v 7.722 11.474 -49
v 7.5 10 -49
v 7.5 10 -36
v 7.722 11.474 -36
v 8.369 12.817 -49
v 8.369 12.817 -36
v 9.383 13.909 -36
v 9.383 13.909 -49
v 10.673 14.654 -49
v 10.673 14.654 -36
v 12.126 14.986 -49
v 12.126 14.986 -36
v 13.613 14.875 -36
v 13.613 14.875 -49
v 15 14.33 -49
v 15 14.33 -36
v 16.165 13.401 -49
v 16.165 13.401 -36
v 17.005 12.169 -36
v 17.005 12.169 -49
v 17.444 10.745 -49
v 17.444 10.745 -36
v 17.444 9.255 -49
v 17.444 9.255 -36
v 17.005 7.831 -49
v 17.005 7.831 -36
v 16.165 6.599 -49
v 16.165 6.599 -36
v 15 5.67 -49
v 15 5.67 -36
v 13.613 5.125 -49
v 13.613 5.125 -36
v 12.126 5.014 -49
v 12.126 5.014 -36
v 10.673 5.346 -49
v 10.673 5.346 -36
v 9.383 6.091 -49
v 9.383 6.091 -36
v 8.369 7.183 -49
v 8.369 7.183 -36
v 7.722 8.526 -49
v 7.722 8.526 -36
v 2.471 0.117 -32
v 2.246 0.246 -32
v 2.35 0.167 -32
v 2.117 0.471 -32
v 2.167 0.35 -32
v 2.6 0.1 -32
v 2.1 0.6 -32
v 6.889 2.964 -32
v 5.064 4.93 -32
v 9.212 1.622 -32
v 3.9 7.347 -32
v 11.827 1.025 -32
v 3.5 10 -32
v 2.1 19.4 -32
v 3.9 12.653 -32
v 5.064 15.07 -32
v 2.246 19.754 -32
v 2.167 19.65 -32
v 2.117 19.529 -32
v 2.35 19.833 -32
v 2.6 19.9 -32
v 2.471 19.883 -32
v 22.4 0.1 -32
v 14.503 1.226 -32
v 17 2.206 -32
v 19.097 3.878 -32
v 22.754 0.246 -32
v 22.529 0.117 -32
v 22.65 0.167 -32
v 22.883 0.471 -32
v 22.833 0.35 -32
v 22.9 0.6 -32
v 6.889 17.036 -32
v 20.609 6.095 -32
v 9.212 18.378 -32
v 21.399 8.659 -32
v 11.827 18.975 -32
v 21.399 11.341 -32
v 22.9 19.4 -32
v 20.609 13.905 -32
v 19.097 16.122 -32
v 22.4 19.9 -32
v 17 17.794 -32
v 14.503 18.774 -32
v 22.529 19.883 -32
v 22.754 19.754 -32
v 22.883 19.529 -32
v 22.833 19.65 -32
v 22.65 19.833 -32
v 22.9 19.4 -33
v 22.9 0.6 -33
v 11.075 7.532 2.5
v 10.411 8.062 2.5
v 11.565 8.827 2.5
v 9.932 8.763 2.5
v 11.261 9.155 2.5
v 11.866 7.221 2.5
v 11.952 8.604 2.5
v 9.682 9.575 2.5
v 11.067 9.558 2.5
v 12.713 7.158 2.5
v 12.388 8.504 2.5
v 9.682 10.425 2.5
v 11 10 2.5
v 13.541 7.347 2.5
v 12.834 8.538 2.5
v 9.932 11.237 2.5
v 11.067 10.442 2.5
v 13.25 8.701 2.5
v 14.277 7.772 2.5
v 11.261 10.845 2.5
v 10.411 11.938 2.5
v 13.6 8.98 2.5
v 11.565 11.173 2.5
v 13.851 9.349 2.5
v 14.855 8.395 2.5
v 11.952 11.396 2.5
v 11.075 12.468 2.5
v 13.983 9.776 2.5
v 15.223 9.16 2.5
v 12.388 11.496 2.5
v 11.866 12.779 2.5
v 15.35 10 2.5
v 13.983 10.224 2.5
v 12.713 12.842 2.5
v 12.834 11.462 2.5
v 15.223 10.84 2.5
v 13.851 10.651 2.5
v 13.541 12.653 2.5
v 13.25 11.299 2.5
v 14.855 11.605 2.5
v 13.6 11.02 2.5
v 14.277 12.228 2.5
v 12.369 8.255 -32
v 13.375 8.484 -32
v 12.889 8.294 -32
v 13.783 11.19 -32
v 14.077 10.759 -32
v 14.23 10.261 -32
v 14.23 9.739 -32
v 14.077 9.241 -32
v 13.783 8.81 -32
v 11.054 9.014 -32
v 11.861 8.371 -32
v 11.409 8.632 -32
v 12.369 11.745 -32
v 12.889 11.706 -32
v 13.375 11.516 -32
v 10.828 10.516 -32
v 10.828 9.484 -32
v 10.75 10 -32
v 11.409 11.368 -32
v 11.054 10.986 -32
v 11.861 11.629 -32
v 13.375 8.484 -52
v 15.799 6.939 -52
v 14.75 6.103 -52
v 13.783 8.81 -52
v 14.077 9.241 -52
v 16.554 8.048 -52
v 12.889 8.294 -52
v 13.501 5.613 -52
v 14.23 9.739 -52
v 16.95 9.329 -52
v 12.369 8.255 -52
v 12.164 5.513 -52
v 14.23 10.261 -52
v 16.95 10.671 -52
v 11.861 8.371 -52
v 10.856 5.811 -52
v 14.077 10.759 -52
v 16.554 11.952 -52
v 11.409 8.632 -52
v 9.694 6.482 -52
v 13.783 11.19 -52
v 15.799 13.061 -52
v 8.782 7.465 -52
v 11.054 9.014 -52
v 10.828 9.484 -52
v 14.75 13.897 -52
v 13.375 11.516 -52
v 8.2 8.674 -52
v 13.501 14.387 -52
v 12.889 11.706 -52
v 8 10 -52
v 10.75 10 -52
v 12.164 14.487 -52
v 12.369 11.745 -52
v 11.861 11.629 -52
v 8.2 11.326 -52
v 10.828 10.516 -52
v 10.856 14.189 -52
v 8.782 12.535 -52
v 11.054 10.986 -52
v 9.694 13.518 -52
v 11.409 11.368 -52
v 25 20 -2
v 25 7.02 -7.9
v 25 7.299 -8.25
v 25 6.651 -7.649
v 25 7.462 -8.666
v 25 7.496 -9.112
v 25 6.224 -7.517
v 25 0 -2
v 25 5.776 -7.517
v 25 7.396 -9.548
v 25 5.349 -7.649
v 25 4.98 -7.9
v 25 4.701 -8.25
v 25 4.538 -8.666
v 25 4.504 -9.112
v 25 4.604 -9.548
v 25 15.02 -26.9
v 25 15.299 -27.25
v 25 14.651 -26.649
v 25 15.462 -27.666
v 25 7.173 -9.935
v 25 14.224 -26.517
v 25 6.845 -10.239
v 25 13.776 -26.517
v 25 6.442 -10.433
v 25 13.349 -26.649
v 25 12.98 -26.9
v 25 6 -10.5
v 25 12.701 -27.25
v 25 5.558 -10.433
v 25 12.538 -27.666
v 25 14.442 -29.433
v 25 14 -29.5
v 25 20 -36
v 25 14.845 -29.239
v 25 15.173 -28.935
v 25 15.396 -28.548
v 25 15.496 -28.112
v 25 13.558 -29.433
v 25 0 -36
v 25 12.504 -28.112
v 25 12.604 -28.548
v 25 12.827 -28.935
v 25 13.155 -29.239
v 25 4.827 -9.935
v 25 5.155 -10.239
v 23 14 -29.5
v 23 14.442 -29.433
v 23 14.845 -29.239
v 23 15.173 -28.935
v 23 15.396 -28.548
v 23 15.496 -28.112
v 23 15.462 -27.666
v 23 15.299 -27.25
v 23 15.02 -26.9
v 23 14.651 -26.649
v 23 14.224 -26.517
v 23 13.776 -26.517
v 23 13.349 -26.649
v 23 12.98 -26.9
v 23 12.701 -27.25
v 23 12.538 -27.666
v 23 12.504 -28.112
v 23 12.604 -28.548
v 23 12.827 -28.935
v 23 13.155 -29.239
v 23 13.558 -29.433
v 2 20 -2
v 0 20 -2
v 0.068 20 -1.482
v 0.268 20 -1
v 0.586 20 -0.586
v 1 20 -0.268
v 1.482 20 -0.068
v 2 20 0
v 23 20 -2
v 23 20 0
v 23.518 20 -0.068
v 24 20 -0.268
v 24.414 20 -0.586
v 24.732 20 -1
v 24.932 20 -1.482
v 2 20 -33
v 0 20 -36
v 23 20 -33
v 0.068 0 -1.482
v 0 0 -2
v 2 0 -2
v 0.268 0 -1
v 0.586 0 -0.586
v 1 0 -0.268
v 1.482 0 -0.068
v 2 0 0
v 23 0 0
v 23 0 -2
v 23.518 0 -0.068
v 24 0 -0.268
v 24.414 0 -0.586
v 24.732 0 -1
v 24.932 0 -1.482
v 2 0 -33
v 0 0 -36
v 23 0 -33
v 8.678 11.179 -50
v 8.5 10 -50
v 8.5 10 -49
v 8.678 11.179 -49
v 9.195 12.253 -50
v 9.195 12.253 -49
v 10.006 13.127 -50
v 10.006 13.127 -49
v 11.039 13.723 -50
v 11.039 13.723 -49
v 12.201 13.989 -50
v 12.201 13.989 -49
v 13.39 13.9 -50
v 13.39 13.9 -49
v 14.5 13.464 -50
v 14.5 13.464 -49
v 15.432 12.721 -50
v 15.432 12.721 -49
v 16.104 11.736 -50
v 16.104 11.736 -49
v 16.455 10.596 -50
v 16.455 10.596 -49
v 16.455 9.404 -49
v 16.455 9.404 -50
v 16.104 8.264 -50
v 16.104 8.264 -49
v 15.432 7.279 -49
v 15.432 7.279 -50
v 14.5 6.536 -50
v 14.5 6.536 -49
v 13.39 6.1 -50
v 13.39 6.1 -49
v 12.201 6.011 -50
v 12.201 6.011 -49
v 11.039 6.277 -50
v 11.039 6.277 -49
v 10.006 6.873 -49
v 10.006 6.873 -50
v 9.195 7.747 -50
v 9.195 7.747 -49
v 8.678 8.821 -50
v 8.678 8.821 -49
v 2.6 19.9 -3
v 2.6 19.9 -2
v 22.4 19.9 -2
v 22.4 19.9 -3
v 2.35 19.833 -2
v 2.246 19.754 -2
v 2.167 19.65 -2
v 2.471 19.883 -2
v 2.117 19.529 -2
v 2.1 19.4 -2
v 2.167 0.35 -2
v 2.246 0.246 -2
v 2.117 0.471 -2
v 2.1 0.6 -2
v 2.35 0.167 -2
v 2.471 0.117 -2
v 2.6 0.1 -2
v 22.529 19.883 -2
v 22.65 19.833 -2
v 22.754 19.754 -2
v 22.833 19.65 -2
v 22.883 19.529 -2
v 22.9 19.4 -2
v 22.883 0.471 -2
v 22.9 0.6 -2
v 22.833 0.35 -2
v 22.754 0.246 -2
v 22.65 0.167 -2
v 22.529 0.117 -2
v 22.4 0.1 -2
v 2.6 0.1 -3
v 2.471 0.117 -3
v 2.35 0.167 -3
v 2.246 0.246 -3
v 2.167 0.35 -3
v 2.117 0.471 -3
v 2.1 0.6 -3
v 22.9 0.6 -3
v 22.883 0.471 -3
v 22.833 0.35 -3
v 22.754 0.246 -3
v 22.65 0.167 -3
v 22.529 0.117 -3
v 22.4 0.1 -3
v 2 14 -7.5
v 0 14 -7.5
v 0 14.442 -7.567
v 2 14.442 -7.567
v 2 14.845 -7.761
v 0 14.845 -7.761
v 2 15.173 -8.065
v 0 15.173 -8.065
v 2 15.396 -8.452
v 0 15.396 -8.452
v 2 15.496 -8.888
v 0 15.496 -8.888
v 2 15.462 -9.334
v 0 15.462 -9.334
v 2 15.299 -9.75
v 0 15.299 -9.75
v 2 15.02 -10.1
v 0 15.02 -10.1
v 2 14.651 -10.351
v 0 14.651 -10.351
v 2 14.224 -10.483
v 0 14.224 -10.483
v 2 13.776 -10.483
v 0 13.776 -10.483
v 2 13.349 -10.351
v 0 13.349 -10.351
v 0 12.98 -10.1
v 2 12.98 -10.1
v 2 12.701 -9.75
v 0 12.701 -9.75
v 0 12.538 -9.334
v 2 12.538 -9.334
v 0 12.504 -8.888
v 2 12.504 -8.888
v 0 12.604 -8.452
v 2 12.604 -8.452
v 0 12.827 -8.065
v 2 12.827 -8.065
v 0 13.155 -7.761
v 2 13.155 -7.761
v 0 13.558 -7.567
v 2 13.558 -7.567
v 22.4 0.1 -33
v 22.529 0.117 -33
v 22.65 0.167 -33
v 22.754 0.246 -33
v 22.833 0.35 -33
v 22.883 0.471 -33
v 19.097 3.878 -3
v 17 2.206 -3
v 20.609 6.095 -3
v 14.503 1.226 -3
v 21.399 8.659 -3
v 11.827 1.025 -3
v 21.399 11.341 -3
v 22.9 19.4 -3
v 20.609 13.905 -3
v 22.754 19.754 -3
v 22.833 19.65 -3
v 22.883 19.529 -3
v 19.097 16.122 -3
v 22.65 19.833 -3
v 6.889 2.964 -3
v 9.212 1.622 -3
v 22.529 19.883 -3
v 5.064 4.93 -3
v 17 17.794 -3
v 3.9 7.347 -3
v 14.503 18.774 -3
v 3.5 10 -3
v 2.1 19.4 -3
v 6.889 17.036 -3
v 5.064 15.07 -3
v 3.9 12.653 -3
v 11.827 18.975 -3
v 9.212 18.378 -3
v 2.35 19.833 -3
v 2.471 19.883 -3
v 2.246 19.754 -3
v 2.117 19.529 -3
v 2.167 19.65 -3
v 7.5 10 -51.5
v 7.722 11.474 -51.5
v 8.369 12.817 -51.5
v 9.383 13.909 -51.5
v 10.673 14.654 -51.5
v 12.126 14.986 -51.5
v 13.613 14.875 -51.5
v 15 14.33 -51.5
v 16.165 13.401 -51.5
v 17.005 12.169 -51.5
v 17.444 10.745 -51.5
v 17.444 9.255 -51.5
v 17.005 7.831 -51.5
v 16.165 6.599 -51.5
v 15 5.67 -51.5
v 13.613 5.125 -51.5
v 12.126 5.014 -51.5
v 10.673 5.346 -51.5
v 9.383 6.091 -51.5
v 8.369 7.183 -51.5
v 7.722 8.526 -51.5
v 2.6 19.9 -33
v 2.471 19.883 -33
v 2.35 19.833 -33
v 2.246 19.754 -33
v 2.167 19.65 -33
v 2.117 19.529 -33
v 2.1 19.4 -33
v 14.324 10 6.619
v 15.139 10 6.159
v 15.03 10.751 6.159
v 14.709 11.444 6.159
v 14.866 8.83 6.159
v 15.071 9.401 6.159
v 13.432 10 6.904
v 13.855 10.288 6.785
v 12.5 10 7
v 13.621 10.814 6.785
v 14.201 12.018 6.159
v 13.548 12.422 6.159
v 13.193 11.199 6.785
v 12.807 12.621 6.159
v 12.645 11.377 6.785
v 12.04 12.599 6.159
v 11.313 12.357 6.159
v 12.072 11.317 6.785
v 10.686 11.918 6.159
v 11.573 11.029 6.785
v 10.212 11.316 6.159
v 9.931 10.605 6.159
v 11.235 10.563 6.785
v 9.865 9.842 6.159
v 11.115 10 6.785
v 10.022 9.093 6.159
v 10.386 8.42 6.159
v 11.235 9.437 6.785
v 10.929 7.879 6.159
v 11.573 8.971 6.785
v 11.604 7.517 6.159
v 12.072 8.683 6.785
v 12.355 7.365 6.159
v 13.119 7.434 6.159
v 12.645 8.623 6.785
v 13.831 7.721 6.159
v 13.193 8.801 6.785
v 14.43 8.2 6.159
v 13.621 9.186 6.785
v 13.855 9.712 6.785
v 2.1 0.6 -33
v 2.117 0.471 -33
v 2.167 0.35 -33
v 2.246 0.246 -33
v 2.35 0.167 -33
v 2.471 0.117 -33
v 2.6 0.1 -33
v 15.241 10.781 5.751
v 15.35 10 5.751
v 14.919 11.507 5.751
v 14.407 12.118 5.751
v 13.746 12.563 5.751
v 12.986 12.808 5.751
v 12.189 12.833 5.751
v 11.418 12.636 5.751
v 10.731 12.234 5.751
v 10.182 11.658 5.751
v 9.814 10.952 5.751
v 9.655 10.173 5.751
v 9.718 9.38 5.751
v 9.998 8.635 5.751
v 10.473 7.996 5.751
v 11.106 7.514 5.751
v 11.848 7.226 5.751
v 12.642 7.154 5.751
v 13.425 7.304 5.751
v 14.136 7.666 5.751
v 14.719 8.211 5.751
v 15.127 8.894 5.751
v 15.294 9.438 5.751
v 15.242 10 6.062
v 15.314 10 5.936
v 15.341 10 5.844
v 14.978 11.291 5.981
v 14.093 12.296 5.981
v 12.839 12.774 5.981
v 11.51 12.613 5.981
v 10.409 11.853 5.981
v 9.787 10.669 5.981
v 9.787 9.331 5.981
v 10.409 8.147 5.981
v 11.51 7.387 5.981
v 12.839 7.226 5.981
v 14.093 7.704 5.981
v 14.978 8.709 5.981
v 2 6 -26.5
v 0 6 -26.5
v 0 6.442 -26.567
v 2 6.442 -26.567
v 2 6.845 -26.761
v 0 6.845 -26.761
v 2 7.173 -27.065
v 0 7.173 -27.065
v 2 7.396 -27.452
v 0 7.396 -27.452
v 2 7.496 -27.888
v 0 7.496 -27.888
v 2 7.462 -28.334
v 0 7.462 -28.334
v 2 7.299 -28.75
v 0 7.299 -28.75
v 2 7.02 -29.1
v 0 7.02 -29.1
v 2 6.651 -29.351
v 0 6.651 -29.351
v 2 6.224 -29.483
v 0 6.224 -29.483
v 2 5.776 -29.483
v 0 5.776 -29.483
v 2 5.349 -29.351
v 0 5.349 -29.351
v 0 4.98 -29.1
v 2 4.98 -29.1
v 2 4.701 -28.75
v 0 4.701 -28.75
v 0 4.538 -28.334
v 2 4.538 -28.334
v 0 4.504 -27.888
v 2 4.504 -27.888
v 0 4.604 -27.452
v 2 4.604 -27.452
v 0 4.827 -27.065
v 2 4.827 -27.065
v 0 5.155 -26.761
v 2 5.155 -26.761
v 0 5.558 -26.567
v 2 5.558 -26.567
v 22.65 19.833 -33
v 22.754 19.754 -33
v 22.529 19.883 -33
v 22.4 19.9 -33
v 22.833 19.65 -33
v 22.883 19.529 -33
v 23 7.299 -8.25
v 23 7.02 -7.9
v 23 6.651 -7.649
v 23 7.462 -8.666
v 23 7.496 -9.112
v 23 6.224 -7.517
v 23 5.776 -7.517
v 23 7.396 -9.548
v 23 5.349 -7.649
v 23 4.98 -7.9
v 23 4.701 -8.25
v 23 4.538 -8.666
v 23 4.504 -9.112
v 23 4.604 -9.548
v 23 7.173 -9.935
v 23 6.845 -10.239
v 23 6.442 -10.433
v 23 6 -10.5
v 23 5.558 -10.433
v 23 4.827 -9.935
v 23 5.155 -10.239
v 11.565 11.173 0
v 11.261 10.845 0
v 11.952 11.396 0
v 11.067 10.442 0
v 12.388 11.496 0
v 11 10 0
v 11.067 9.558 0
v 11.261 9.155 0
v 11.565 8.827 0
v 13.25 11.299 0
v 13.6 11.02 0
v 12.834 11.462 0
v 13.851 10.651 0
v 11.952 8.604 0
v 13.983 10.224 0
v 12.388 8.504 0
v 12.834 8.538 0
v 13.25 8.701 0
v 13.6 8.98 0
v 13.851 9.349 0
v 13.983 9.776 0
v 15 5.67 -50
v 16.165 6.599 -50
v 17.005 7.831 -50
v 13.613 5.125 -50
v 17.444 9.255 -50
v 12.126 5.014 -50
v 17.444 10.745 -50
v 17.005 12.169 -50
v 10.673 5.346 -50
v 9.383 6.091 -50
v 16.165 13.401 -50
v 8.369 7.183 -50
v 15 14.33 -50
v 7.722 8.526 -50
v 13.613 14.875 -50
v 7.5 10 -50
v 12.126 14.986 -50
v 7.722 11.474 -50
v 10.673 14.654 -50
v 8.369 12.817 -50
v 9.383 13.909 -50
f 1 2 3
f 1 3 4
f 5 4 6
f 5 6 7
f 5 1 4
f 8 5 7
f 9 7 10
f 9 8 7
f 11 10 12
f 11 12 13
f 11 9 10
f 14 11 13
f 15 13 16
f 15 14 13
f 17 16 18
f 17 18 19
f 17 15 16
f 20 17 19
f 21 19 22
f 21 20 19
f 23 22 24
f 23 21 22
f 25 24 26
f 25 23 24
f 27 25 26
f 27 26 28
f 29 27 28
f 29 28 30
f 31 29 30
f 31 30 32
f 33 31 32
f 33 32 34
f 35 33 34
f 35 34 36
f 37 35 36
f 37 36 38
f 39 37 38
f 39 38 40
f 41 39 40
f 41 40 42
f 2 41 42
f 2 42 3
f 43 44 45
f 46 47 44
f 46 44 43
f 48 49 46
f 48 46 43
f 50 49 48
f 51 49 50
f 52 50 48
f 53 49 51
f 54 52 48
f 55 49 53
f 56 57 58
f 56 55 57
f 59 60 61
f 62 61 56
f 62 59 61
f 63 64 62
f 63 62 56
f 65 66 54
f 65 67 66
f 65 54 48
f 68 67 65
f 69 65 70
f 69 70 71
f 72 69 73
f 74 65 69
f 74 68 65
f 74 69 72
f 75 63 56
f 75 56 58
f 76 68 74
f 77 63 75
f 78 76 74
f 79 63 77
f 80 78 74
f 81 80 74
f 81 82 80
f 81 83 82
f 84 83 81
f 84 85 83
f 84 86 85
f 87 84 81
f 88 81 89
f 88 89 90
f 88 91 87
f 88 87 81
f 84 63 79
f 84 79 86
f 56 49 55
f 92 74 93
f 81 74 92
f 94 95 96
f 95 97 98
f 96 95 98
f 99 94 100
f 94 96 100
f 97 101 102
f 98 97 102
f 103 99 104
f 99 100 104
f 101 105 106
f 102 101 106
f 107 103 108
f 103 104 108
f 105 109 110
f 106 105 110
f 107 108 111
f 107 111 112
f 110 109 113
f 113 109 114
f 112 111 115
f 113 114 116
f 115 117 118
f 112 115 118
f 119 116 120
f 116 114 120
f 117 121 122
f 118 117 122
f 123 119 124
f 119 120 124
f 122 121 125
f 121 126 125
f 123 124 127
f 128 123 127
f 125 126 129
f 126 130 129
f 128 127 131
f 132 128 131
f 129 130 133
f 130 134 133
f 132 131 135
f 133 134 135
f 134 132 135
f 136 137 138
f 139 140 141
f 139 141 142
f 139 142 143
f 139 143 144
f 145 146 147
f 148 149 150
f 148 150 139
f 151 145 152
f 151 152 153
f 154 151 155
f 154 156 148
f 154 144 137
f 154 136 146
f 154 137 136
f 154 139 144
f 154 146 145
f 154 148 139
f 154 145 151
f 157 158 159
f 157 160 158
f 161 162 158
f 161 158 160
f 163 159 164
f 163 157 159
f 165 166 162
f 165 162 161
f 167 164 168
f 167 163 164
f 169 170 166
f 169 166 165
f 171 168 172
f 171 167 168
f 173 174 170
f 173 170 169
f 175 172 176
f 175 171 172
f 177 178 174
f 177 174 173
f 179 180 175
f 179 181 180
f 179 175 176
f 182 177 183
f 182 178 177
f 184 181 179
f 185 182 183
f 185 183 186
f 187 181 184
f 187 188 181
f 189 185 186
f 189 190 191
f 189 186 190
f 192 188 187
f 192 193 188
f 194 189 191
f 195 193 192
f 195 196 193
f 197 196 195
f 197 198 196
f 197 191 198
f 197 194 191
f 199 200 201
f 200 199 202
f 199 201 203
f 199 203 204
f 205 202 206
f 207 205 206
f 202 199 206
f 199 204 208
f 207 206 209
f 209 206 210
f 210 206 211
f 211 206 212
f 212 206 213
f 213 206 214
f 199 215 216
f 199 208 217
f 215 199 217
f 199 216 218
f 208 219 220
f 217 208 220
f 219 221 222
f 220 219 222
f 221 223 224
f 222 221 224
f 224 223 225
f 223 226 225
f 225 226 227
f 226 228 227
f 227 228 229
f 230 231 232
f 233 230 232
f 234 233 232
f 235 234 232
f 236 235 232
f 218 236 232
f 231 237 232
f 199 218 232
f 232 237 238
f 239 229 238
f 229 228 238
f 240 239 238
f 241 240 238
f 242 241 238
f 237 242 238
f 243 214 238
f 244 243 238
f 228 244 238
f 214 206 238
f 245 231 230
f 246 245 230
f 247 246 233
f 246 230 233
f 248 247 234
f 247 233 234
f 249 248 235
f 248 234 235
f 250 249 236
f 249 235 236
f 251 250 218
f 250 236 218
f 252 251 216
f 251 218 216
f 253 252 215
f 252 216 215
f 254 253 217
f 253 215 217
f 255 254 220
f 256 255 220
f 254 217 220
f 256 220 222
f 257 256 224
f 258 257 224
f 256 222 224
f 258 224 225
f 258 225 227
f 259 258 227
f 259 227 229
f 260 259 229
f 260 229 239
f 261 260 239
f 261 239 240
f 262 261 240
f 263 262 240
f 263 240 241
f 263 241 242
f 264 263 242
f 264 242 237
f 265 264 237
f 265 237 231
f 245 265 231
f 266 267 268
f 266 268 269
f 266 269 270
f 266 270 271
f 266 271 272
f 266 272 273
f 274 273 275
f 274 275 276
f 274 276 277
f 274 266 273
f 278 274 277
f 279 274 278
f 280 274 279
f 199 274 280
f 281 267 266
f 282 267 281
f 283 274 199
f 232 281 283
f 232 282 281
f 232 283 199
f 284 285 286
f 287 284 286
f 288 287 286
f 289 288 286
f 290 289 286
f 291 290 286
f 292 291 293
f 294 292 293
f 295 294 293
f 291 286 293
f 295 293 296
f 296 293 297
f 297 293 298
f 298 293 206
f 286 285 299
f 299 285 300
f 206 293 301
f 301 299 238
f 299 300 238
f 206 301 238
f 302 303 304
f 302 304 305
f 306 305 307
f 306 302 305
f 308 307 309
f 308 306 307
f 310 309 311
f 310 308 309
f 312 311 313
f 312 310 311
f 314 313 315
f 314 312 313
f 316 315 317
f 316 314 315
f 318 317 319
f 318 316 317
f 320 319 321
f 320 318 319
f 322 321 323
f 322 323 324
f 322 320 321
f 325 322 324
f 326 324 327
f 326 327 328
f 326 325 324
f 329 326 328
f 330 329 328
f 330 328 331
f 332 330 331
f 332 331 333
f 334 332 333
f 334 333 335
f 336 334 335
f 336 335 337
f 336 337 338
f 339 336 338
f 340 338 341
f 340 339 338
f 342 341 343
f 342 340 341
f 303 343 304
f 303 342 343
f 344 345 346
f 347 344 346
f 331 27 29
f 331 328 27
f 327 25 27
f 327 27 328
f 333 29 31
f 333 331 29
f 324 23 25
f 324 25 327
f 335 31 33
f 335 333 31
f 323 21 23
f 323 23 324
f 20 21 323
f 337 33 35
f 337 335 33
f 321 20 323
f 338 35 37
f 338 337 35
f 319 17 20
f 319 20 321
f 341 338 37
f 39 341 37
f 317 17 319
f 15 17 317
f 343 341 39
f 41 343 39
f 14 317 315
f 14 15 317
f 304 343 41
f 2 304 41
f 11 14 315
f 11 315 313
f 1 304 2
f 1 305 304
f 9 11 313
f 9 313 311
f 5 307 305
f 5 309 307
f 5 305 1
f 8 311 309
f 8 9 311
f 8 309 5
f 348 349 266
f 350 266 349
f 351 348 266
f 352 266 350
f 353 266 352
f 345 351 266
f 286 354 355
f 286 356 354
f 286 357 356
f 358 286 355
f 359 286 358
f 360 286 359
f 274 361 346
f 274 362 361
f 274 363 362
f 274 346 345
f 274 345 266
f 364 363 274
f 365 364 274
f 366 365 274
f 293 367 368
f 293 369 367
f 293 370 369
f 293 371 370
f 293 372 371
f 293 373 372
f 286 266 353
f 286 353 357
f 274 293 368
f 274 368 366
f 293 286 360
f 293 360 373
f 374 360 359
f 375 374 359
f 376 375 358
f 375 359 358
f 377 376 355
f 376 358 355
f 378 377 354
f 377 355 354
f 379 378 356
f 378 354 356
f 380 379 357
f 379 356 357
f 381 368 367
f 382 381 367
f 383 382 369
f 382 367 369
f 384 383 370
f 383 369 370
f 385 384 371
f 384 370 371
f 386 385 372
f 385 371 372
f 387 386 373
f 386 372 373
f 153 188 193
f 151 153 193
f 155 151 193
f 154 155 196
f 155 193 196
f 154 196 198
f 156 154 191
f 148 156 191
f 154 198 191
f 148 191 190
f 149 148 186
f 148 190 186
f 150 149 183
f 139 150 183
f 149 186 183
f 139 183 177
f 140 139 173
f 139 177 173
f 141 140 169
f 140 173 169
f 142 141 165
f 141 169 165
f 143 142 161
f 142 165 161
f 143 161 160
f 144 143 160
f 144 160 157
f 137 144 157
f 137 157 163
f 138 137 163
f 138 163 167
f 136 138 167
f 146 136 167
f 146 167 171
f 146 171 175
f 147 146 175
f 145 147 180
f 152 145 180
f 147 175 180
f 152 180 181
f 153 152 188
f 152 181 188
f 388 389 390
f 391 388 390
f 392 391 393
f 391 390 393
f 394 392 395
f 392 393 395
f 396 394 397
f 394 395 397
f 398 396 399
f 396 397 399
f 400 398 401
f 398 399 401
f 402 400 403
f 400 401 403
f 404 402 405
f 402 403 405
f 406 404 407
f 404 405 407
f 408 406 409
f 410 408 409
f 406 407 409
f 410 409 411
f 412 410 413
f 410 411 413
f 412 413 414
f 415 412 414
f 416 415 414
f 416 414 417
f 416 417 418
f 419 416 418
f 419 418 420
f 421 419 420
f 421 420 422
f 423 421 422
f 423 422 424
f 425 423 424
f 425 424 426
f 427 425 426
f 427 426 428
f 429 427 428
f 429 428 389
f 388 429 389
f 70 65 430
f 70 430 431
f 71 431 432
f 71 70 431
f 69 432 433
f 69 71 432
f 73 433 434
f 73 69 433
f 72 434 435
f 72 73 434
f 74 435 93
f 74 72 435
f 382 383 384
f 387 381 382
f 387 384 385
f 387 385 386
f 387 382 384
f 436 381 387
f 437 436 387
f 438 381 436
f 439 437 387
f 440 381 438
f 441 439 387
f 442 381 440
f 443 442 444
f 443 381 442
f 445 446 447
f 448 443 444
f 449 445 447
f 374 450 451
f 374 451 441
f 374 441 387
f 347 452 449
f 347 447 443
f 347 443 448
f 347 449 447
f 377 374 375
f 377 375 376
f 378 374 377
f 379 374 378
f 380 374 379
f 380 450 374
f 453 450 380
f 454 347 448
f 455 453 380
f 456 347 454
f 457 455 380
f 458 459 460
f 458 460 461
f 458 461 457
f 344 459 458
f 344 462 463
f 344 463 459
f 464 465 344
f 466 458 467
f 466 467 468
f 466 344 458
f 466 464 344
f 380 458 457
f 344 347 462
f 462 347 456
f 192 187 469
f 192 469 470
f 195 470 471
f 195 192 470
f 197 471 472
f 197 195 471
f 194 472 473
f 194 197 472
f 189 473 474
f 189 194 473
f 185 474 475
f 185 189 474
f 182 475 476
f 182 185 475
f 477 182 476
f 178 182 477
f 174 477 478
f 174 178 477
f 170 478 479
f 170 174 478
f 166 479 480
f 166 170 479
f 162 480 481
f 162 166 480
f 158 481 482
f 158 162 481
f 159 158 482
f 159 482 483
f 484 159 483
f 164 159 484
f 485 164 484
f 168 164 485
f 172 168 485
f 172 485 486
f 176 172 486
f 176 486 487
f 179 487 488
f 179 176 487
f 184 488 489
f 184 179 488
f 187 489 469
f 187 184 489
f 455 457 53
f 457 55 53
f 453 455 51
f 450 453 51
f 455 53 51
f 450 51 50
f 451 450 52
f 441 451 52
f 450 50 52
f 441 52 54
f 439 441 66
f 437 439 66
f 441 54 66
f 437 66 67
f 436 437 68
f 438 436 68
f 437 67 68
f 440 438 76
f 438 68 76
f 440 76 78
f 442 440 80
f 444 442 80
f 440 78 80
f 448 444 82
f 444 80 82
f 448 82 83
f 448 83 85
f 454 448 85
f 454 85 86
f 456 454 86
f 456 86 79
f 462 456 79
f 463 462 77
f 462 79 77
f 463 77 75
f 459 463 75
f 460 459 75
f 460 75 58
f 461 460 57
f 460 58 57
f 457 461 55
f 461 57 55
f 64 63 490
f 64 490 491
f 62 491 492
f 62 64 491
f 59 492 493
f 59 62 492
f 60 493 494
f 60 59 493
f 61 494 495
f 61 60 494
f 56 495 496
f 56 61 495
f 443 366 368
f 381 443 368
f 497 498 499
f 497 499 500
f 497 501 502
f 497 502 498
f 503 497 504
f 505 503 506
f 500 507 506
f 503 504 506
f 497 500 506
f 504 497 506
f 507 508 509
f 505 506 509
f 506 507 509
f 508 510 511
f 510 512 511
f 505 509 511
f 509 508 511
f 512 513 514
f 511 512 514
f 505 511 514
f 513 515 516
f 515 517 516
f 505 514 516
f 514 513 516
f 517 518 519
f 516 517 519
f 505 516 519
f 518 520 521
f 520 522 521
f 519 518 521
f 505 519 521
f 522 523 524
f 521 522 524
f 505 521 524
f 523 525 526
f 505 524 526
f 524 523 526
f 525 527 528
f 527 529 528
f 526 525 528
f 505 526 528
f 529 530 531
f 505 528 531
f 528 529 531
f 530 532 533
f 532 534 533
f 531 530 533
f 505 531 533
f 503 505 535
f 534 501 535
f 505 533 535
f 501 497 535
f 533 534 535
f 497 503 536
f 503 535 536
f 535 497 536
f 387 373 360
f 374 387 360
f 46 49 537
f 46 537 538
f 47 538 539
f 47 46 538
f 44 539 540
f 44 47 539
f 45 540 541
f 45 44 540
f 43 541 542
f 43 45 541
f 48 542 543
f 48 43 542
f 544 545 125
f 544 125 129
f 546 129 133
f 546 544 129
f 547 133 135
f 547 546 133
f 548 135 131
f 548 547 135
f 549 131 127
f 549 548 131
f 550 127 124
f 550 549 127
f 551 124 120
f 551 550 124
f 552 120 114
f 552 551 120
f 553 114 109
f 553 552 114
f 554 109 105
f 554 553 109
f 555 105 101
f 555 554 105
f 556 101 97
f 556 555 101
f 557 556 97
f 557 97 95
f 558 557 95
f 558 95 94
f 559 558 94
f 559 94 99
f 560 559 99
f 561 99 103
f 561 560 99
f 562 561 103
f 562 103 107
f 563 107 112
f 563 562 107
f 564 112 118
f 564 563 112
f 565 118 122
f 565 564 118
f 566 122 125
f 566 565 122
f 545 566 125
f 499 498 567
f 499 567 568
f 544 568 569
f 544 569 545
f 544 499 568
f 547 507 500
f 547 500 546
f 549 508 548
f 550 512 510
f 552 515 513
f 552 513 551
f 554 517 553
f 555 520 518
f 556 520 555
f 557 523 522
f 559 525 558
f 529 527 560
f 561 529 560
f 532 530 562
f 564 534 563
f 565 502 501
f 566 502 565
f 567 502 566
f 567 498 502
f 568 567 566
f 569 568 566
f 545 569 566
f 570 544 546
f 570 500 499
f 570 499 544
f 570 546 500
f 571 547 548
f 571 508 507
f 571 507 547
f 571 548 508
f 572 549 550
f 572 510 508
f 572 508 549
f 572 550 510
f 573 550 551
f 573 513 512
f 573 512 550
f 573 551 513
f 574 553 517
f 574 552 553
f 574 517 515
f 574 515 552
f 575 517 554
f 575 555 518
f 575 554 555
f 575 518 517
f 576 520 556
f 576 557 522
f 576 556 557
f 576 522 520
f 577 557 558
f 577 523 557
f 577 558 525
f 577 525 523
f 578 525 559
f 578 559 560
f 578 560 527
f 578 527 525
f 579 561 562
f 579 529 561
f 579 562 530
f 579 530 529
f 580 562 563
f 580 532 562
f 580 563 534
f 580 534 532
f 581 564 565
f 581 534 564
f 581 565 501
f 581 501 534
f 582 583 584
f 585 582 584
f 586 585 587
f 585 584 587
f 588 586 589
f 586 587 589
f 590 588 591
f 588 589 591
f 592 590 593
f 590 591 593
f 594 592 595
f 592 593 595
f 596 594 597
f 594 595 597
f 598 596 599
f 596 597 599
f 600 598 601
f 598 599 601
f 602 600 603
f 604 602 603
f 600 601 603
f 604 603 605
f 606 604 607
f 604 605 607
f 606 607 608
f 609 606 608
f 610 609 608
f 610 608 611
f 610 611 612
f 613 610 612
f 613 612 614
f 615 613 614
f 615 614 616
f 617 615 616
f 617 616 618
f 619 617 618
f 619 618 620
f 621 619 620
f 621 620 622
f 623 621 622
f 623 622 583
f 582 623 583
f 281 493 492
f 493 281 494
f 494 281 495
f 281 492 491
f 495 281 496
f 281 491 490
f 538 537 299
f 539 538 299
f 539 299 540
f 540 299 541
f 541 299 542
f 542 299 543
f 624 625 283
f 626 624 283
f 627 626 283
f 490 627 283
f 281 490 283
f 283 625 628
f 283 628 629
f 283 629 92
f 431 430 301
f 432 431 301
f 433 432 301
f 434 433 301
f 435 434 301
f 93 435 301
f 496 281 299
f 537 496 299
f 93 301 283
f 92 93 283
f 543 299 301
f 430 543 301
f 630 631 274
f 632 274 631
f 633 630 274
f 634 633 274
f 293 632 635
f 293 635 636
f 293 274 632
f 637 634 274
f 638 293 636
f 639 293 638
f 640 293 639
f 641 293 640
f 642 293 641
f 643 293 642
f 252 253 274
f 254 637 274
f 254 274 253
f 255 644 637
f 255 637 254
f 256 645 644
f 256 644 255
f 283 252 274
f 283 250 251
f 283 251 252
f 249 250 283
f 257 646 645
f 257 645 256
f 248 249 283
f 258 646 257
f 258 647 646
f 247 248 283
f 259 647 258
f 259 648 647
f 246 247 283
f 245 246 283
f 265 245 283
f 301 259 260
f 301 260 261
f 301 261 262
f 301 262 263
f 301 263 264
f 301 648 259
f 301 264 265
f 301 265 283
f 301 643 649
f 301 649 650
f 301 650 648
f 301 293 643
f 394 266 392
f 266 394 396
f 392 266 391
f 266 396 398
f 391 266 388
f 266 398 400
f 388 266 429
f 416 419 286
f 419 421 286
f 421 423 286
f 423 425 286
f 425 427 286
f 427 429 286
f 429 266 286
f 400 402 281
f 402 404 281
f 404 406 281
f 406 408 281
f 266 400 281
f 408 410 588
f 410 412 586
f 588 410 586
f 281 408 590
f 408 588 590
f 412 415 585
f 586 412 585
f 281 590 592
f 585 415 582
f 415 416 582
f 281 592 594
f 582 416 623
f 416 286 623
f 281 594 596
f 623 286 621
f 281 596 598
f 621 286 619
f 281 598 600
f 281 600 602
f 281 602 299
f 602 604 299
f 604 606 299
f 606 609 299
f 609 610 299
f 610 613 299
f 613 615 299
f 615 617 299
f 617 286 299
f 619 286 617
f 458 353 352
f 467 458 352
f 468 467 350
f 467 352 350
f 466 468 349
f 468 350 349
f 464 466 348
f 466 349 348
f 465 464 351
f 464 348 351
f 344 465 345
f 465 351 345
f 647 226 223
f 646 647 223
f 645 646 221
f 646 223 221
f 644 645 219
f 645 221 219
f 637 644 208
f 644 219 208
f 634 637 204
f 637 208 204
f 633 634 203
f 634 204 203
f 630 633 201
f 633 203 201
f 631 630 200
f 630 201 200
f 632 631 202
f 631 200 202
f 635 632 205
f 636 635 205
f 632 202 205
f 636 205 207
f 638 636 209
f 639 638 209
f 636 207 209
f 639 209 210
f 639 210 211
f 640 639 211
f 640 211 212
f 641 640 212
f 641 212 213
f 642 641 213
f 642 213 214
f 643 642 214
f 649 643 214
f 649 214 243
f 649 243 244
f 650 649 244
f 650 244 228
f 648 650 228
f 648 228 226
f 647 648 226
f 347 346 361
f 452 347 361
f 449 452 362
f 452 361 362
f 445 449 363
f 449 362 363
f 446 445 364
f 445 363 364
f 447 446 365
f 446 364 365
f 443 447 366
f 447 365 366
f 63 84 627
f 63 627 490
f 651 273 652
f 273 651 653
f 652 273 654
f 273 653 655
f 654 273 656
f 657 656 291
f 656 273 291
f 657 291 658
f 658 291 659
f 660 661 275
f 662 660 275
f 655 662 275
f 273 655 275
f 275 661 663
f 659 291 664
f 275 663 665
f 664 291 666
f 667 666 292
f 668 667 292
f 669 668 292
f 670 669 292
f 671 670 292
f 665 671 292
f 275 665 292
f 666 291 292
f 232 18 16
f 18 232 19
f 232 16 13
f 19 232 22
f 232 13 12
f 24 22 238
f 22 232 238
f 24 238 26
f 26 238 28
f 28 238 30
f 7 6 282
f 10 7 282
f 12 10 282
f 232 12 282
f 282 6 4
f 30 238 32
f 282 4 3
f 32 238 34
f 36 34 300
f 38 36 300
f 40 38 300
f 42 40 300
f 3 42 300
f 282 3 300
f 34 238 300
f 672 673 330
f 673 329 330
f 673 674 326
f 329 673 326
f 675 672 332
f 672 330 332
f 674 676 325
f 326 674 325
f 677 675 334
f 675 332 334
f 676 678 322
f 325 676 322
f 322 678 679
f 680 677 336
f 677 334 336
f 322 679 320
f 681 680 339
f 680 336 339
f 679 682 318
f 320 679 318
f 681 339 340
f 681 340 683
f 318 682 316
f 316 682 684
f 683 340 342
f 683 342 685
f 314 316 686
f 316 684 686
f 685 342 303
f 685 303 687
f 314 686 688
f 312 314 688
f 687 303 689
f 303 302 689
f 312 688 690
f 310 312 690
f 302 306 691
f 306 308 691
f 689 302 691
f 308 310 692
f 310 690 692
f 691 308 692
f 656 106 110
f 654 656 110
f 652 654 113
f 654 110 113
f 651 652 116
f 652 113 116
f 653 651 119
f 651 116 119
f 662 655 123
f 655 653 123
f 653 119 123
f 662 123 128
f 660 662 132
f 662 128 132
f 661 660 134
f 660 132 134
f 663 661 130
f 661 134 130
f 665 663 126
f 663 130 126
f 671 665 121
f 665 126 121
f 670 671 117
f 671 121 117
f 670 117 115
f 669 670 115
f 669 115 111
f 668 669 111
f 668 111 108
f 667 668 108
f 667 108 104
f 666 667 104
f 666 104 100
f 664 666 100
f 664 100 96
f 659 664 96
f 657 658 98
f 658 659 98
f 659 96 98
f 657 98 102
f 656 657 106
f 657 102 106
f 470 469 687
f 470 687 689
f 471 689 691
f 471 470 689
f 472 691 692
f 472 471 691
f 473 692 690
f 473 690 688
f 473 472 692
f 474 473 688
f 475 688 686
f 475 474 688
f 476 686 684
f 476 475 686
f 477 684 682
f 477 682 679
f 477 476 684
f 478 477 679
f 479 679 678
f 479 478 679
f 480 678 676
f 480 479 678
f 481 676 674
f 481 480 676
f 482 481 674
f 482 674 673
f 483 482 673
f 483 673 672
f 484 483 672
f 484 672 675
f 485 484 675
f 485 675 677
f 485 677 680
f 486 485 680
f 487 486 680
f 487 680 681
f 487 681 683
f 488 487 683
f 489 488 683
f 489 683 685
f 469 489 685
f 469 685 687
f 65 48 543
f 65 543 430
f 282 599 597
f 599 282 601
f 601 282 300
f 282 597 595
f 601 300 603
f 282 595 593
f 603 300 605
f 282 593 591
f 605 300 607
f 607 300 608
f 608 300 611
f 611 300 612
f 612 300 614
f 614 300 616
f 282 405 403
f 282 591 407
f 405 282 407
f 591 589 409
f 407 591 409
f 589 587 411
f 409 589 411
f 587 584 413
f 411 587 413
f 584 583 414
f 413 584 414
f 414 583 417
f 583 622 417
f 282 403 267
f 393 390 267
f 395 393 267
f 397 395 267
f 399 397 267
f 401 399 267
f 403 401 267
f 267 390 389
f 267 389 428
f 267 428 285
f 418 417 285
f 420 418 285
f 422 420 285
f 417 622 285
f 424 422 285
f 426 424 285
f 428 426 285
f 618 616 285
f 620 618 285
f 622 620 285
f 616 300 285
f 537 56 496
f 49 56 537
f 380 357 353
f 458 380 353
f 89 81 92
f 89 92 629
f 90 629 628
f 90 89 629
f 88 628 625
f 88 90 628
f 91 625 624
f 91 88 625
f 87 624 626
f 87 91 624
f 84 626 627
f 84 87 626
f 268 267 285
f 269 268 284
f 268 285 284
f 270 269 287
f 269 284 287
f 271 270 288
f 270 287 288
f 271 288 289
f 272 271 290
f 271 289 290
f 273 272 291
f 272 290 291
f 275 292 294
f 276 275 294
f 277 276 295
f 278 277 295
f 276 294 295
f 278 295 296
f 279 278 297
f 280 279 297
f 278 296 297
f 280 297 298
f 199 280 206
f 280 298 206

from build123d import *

# Parameters (mm, degrees)
SKETCH_1_W          = 21
SKETCH_1_H          = 31
EXTRUDE_1_DEPTH     = 20
CUT_EXTRUDE_5_REACH = 50.177
SKETCH_14_R         = 1.5
CUT_EXTRUDE_6_REACH = 50.177
SKETCH_15_R         = 1.5
EXTRUDE_2_DEPTH     = 1
EXTRUDE_START       = 1
EXTRUDE_3_DEPTH     = 1
SKETCH_4_R          = 1.5
CUT_EXTRUDE_1_DEPTH = 3
SKETCH_5_R          = 5
CUT_EXTRUDE_2_DEPTH = 4
SKETCH_6_W          = 9
SKETCH_6_H          = 29
EXTRUDE_START_2     = -8
SKETCH_7_R          = 1.5
EXTRUDE_4_DEPTH     = 8
EXTRUDE_START_3     = 20
SKETCH_8_R          = 5
EXTRUDE_5_DEPTH     = 20
SKETCH_10_R         = 1.75
CUT_EXTRUDE_4_DEPTH = 20
SKETCH_9_R          = 5
SKETCH_9_R_2        = 4
CUT_EXTRUDE_3_DEPTH = 1
SKETCH_11_R         = 2.85
EXTRUDE_6_DEPTH     = 3.5
FILLET_1_R          = 0.5
CHAMFER_1_SIZE      = 0.5


with BuildPart() as part:
    # ｽｹｯﾁ1 → ﾎﾞｽ - 押し出し1 (new body)
    with BuildSketch(Plane(origin=(0, 0, 0), x_dir=(1, 0, 0), z_dir=(0, 1, 0))):
        with BuildLine():
            Line((2, 0), (23, 0))
            ThreePointArc((23, 0), (24.414213562, 0.585786438), (25, 2))
            Line((25, 2), (25, 36))
            Line((25, 36), (0, 36))
            Line((0, 36), (0, 2))
            ThreePointArc((0, 2), (0.585786438, 0.585786438), (2, 0))
        make_face()
        with Locations((12.5, 17.5)):
            Rectangle(SKETCH_1_W, SKETCH_1_H, mode=Mode.SUBTRACT)
    extrude(amount=EXTRUDE_1_DEPTH)

    # ｽｹｯﾁ14 → ｶｯﾄ - 押し出し5 (cut, up to next)
    with BuildSketch(Plane(origin=(25, 0, 0), x_dir=(0, 0, -1), z_dir=(1, 0, 0)), mode=Mode.PRIVATE) as cut_extrude_5_sk1:
        with Locations((9, 6)):
            Circle(SKETCH_14_R)
    cut_extrude_5_tool1 = extrude(cut_extrude_5_sk1.sketch, amount=-CUT_EXTRUDE_5_REACH, mode=Mode.PRIVATE) & part.part
    # ｽｹｯﾁ14 → ｶｯﾄ - 押し出し5 (cut, up to next)
    with BuildSketch(Plane(origin=(25, 0, 0), x_dir=(0, 0, -1), z_dir=(1, 0, 0)), mode=Mode.PRIVATE) as cut_extrude_5_sk2:
        with Locations((28, 14)):
            Circle(SKETCH_14_R)
    cut_extrude_5_tool2 = extrude(cut_extrude_5_sk2.sketch, amount=-CUT_EXTRUDE_5_REACH, mode=Mode.PRIVATE) & part.part
    add(cut_extrude_5_tool1.solids().sort_by_distance((25, 6, -9))[0], mode=Mode.SUBTRACT)
    add(cut_extrude_5_tool2.solids().sort_by_distance((25, 14, -28))[0], mode=Mode.SUBTRACT)

    # ｽｹｯﾁ15 → ｶｯﾄ - 押し出し6 (cut, up to next)
    with BuildSketch(Plane.ZY, mode=Mode.PRIVATE) as cut_extrude_6_sk1:
        with Locations((-28, 6)):
            Circle(SKETCH_15_R)
    cut_extrude_6_tool1 = extrude(cut_extrude_6_sk1.sketch, amount=-CUT_EXTRUDE_6_REACH, mode=Mode.PRIVATE) & part.part
    # ｽｹｯﾁ15 → ｶｯﾄ - 押し出し6 (cut, up to next)
    with BuildSketch(Plane.ZY, mode=Mode.PRIVATE) as cut_extrude_6_sk2:
        with Locations((-9, 14)):
            Circle(SKETCH_15_R)
    cut_extrude_6_tool2 = extrude(cut_extrude_6_sk2.sketch, amount=-CUT_EXTRUDE_6_REACH, mode=Mode.PRIVATE) & part.part
    add(cut_extrude_6_tool1.solids().sort_by_distance((0, 6, -28))[0], mode=Mode.SUBTRACT)
    add(cut_extrude_6_tool2.solids().sort_by_distance((0, 14, -9))[0], mode=Mode.SUBTRACT)

    # ｽｹｯﾁ2 → ﾎﾞｽ - 押し出し2 (add)
    with BuildSketch(Plane(origin=(0, 0, -2), x_dir=(-1, 0, 0), z_dir=(0, 0, -1))):
        with BuildLine():
            Line((-22.4, 0.1), (-2.6, 0.1))
            ThreePointArc((-2.6, 0.1), (-2.246446609, 0.246446609), (-2.1, 0.6))
            Line((-2.1, 0.6), (-2.1, 19.4))
            ThreePointArc((-2.1, 19.4), (-2.246446609, 19.753553391), (-2.6, 19.9))
            Line((-2.6, 19.9), (-22.4, 19.9))
            ThreePointArc((-22.4, 19.9), (-22.753553391, 19.753553391), (-22.9, 19.4))
            Line((-22.9, 19.4), (-22.9, 0.6))
            ThreePointArc((-22.9, 0.6), (-22.753553391, 0.246446609), (-22.4, 0.1))
        make_face()
    extrude(amount=EXTRUDE_2_DEPTH)

    # ｽｹｯﾁ3 → ﾎﾞｽ - 押し出し3 (add)
    with BuildSketch(Plane.XY.offset(-33).offset(EXTRUDE_START)):
        with BuildLine():
            Line((2.6, 0.1), (22.4, 0.1))
            ThreePointArc((22.4, 0.1), (22.753553391, 0.246446609), (22.9, 0.6))
            Line((22.9, 0.6), (22.9, 19.4))
            ThreePointArc((22.9, 19.4), (22.753553391, 19.753553391), (22.4, 19.9))
            Line((22.4, 19.9), (2.6, 19.9))
            ThreePointArc((2.6, 19.9), (2.246446609, 19.753553391), (2.1, 19.4))
            Line((2.1, 19.4), (2.1, 0.6))
            ThreePointArc((2.1, 0.6), (2.246446609, 0.246446609), (2.6, 0.1))
        make_face()
    extrude(amount=-EXTRUDE_3_DEPTH)

    # ｽｹｯﾁ4 → ｶｯﾄ - 押し出し1 (cut)
    with BuildSketch(Plane.XY):
        with Locations((12.5, 10)):
            Circle(SKETCH_4_R)
    extrude(amount=-CUT_EXTRUDE_1_DEPTH, mode=Mode.SUBTRACT)

    # ｽｹｯﾁ5 → ｶｯﾄ - 押し出し2 (cut)
    with BuildSketch(Plane(origin=(0, 0, -36), x_dir=(-1, 0, 0), z_dir=(0, 0, -1))):
        with Locations((-12.5, 10)):
            Circle(SKETCH_5_R)
    extrude(amount=-CUT_EXTRUDE_2_DEPTH, mode=Mode.SUBTRACT)

    # ｽｹｯﾁ6 → 回転1 (revolve)
    with BuildSketch(Plane(origin=(0, 10, 0), x_dir=(1, 0, 0), z_dir=(0, 1, 0))):
        with Locations((8, 17.5)):
            Rectangle(SKETCH_6_W, SKETCH_6_H)
    revolve(axis=Axis((12.5, 10, -32), (0, 0, 1)))

    # ｽｹｯﾁ7 → ﾎﾞｽ - 押し出し4 (add)
    with BuildSketch(Plane(origin=(0, 0, -3), x_dir=(-1, 0, 0), z_dir=(0, 0, -1)).offset(EXTRUDE_START_2)):
        with Locations((-12.5, 10)):
            Circle(SKETCH_7_R)
    extrude(amount=EXTRUDE_4_DEPTH)

    # ｽｹｯﾁ8 → ﾎﾞｽ - 押し出し5 (add)
    with BuildSketch(Plane(origin=(0, 0, -32), x_dir=(-1, 0, 0), z_dir=(0, 0, -1)).offset(EXTRUDE_START_3)):
        with Locations((-12.5, 10)):
            Circle(SKETCH_8_R)
    extrude(amount=-EXTRUDE_5_DEPTH)

    # ｽｹｯﾁ10 → ｶｯﾄ - 押し出し4 (cut)
    with BuildSketch(Plane(origin=(0, 0, -52), x_dir=(-1, 0, 0), z_dir=(0, 0, -1))):
        with Locations((-12.5, 10)):
            Circle(SKETCH_10_R)
    extrude(amount=-CUT_EXTRUDE_4_DEPTH, mode=Mode.SUBTRACT)

    # ｽｹｯﾁ9 → ｶｯﾄ - 押し出し3 (cut)
    with BuildSketch(Plane(origin=(0, 0, -50), x_dir=(-1, 0, 0), z_dir=(0, 0, -1))):
        with Locations((-12.5, 10)):
            Circle(SKETCH_9_R)
        with Locations((-12.5, 10)):
            Circle(SKETCH_9_R_2, mode=Mode.SUBTRACT)
    extrude(amount=-CUT_EXTRUDE_3_DEPTH, mode=Mode.SUBTRACT)

    # ｽｹｯﾁ11 → ﾎﾞｽ - 押し出し6 (add)
    with BuildSketch(Plane.XY.offset(6)):
        with Locations((12.5, 10)):
            Circle(SKETCH_11_R)
    extrude(amount=-EXTRUDE_6_DEPTH)

    # ｽｹｯﾁ12 → 回転2 (revolve)
    with BuildSketch(Plane.ZY.offset(-12.5), mode=Mode.PRIVATE) as revolve_2_sk:
        with BuildLine():
            Line((6, 10), (7, 10))
            ThreePointArc((7, 10), (6.742745419, 11.510173831), (6, 12.85))
            Line((6, 12.85), (6, 10))
        make_face()
    revolve(revolve_2_sk.sketch.rotate(Axis((12.5, 10, 6), (0, 0, 1)), 270), axis=Axis((12.5, 10, 6), (0, 0, 1)))

    # ﾌｨﾚｯﾄ1
    fillet_1_edges = [part.edges().sort_by_distance(p)[0] for p in [
        (9.65, 10, 6),
    ]]
    fillet(fillet_1_edges, radius=FILLET_1_R)

    # 面取り1
    chamfer_1_edges = [part.edges().sort_by_distance(p)[0] for p in [
        (17.5, 10, -52),
    ]]
    chamfer(chamfer_1_edges, length=CHAMFER_1_SIZE)


solid = part.part
